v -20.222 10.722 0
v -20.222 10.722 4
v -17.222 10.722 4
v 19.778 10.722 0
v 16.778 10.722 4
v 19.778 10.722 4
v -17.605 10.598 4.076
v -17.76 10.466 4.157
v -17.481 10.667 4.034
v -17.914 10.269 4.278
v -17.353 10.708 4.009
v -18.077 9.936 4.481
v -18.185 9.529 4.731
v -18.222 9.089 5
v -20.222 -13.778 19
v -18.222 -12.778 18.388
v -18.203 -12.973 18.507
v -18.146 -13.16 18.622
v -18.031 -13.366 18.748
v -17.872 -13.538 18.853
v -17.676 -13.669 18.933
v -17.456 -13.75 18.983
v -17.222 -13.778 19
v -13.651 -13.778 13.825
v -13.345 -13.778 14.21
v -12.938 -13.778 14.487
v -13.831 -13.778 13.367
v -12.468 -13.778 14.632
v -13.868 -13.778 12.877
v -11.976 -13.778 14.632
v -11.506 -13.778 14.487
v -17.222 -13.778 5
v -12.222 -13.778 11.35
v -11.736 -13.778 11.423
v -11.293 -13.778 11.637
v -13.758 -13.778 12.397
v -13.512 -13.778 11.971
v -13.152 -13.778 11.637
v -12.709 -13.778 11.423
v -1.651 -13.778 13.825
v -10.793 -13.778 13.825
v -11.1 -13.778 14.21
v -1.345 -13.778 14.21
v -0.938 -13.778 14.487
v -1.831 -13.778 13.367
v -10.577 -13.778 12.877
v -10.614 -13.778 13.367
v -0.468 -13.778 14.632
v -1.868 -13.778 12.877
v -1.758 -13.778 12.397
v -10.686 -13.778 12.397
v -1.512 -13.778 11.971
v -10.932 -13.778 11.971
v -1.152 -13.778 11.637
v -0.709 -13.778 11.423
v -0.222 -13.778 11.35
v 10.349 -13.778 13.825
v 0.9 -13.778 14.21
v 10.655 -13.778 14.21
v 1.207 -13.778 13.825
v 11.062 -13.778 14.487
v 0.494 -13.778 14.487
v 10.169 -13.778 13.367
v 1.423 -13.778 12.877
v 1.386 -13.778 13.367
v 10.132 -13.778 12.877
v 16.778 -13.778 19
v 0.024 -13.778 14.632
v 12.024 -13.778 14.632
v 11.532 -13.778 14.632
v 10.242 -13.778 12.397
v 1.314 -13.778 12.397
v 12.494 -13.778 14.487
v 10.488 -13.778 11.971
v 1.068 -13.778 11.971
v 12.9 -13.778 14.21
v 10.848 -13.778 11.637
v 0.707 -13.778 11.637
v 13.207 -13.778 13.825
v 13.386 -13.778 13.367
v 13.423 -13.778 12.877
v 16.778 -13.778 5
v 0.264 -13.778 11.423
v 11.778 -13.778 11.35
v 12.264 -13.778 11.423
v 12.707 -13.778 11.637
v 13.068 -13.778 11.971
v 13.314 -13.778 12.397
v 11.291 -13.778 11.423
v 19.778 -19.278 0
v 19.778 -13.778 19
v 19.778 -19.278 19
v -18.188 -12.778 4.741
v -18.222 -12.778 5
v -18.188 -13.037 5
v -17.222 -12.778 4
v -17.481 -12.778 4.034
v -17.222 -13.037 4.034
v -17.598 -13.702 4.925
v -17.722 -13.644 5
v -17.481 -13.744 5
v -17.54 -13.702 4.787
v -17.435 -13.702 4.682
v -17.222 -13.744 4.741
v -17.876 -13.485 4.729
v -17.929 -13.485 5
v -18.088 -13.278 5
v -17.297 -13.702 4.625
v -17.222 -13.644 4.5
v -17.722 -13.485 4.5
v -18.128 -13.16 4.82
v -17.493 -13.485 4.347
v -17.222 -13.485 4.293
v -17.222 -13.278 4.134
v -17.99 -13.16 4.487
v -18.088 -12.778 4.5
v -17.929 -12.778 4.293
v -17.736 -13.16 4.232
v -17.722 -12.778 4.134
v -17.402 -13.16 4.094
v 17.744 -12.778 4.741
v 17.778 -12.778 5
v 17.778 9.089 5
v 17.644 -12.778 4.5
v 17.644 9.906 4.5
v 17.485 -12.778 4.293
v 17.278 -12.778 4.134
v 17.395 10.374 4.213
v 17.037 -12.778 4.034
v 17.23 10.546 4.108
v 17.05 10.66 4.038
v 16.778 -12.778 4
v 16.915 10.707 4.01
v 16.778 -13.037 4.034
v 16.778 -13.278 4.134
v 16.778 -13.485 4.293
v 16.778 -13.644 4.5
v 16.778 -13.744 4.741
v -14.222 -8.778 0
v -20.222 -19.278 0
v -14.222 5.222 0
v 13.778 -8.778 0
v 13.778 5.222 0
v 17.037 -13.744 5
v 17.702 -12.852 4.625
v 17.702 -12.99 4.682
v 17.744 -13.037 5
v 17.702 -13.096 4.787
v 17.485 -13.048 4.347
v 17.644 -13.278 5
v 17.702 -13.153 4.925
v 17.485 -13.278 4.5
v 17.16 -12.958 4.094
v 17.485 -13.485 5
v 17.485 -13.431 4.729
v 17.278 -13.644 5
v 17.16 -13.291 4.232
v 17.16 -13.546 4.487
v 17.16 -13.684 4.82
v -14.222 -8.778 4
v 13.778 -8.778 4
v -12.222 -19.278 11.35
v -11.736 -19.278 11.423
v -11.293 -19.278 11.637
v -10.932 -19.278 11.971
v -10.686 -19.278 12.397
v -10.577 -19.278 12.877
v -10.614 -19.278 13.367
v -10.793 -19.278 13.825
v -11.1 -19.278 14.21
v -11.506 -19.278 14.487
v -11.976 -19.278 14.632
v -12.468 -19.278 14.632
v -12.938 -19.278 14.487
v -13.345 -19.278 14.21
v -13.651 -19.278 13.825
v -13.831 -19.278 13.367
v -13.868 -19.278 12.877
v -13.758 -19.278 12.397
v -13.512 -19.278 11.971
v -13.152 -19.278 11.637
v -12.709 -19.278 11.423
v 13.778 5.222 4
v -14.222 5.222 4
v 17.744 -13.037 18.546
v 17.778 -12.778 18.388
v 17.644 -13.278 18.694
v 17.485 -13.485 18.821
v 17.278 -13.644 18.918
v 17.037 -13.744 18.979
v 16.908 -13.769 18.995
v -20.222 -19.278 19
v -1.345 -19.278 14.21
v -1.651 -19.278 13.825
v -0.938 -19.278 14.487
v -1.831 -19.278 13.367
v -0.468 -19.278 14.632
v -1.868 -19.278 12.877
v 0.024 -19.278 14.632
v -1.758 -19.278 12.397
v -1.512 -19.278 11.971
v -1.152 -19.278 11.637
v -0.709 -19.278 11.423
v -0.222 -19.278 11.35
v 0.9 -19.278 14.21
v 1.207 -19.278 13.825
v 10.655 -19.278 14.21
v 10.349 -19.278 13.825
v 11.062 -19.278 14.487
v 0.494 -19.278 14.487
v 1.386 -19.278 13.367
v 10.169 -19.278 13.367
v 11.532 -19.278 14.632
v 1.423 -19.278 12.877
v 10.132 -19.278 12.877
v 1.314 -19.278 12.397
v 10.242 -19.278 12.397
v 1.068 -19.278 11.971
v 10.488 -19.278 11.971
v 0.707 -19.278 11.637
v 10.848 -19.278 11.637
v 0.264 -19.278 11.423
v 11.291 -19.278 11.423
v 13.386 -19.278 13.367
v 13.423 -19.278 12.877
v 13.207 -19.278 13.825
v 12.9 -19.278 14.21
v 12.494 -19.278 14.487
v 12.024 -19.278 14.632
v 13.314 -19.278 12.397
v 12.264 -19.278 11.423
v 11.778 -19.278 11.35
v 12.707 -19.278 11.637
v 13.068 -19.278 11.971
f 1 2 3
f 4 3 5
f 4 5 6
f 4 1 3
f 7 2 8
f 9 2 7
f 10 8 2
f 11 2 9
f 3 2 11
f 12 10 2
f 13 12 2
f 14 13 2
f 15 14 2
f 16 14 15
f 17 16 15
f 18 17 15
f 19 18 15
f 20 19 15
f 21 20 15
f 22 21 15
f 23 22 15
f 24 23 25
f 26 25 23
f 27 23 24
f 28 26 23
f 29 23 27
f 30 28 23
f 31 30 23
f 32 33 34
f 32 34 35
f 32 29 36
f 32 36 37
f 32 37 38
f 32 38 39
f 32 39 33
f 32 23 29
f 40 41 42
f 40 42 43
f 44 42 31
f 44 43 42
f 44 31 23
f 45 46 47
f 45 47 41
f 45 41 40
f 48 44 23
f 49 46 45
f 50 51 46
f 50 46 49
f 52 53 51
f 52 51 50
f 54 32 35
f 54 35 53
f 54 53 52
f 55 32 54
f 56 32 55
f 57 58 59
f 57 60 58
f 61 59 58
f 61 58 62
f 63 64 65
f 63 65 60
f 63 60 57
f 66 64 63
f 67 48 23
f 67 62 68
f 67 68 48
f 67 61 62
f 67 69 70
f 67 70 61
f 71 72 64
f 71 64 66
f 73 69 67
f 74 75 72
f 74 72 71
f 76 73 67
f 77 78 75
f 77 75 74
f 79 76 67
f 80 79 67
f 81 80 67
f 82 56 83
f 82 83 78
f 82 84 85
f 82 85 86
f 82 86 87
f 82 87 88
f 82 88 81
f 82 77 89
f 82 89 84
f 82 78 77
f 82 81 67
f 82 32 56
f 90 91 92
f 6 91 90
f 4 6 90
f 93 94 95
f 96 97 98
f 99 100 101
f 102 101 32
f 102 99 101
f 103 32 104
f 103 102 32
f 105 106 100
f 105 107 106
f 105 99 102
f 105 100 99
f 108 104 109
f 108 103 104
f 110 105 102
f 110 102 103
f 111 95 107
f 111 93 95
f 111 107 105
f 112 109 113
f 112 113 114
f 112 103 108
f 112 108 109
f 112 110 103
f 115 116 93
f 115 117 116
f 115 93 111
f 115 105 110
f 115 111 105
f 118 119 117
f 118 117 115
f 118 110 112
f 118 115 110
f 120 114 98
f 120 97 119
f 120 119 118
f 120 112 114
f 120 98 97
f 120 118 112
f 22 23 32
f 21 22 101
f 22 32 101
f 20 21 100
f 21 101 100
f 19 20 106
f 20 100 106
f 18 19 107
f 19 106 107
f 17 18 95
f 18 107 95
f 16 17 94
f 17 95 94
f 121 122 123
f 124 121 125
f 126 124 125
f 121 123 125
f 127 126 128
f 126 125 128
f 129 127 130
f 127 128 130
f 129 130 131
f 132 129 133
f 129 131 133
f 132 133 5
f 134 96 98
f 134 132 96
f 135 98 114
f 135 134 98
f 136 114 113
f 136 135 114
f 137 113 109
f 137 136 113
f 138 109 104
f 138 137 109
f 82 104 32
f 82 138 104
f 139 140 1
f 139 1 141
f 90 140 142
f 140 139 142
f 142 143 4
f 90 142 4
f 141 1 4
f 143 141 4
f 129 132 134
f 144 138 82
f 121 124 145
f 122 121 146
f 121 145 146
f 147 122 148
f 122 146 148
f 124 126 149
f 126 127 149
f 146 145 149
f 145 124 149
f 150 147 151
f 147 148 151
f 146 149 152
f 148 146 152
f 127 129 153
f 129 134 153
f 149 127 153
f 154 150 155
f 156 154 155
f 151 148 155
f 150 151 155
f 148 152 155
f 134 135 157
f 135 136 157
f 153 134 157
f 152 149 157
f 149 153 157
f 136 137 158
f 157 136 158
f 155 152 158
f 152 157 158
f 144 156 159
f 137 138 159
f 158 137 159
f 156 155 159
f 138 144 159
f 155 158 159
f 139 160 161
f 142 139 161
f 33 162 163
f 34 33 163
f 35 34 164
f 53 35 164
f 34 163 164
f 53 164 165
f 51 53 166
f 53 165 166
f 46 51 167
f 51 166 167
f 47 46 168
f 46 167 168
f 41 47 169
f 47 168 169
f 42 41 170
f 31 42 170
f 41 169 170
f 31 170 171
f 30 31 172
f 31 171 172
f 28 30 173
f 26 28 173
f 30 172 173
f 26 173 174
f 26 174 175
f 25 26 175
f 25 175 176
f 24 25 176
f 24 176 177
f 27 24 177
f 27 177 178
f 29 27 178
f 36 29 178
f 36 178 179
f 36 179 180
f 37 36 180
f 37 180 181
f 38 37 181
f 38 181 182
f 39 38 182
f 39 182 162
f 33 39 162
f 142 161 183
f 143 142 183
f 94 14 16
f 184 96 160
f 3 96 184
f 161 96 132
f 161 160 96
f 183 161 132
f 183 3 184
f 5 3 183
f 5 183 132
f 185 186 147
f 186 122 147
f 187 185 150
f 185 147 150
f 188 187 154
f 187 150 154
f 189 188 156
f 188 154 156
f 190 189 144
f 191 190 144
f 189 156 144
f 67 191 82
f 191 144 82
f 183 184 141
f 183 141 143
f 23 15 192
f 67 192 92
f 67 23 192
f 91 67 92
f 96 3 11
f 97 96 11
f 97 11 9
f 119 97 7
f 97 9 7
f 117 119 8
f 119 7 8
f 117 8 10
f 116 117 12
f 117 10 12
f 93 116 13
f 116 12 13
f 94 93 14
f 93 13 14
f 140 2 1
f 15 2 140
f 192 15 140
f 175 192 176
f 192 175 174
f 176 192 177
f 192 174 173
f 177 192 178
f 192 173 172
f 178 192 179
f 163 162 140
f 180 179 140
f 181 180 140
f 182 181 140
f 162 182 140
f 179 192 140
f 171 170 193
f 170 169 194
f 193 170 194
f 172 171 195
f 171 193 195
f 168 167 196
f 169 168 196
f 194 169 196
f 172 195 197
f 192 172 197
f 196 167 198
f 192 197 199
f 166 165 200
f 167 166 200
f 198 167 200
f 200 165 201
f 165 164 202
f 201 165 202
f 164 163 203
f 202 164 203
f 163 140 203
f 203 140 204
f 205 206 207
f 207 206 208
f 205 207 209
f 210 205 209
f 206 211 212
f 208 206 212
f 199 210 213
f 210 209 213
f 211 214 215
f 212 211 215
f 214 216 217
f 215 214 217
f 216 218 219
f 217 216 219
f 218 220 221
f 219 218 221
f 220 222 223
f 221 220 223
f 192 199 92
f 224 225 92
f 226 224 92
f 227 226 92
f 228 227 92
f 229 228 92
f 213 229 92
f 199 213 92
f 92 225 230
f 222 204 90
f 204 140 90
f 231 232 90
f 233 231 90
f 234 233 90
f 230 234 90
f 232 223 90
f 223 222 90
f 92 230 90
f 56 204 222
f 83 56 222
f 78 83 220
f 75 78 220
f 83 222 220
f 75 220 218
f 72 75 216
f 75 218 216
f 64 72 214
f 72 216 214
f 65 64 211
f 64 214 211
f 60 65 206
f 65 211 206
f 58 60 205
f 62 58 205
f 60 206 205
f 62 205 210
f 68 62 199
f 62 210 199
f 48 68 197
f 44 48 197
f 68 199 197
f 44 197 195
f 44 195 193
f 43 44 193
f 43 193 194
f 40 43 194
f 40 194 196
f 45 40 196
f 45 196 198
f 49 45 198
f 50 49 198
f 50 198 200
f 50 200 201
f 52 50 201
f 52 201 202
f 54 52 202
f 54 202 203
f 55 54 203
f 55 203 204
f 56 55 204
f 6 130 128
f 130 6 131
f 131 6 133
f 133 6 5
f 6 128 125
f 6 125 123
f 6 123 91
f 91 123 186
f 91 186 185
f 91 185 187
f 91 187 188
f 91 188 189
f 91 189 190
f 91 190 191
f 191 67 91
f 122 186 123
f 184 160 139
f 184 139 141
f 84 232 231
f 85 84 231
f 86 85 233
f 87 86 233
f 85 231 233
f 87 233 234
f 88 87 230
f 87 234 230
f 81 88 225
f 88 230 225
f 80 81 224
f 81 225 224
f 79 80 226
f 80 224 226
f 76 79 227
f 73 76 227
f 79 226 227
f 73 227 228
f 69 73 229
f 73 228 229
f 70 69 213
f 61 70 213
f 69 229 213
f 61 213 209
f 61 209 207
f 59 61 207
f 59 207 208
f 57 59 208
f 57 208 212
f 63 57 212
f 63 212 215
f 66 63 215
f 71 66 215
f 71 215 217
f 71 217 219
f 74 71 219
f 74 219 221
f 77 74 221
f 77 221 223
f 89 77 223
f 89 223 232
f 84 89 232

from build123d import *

# Parameters (mm, degrees)
SKETCH1_W           = 40
SKETCH1_H           = 30
BOSS_EXTRUDE1_DEPTH = 4
SKETCH4_W           = 28
SKETCH4_H           = 14
CUT_EXTRUDE1_DEPTH  = 5.5
SKETCH5_W           = 40
SKETCH5_H           = 5.5
BOSS_EXTRUDE2_DEPTH = 15
SKETCH6_R           = 1.65
CUT_EXTRUDE3_DEPTH  = 15
RIB1_REACH          = 50.297
SKETCH8_WALL_W      = 127.321837908
SKETCH8_WALL_H      = 2
RIB14_REACH         = 50.297
SKETCH11_WALL_W     = 127.321837908
SKETCH11_WALL_H     = 2
FILLET1_R           = 1


with BuildPart() as part:
    # Sketch1 → Boss-Extrude1 (new body)
    with BuildSketch(Plane.XY):
        with Locations((-0.222222222, -4.277777778)):
            Rectangle(SKETCH1_W, SKETCH1_H)
    extrude(amount=BOSS_EXTRUDE1_DEPTH)

    # Sketch4 → Cut-Extrude1 (cut)
    with BuildSketch(Plane.XY.offset(4)):
        with Locations((-0.222222222, -1.777777778)):
            Rectangle(SKETCH4_W, SKETCH4_H)
    extrude(amount=-CUT_EXTRUDE1_DEPTH, mode=Mode.SUBTRACT)

    # Sketch5 → Boss-Extrude2 (add)
    with BuildSketch(Plane.XY.offset(4)):
        with Locations((-0.222222222, -16.527777778)):
            Rectangle(SKETCH5_W, SKETCH5_H)
    extrude(amount=BOSS_EXTRUDE2_DEPTH)

    # Sketch6 → Cut-Extrude3 (cut)
    with BuildSketch(Plane.XZ.offset(19.277777778)):
        with Locations((-12.222222222, 13)):
            Circle(SKETCH6_R)
        with Locations((-0.222222222, 13)):
            Circle(SKETCH6_R)
        with Locations((11.777777778, 13)):
            Circle(SKETCH6_R)
    extrude(amount=-CUT_EXTRUDE3_DEPTH, mode=Mode.SUBTRACT)

    # Sketch8 wall → Rib1 (add, up to next)
    with BuildSketch(Plane(origin=(-20.222222222, -1.527777778, 11.5), x_dir=(0, -0.852851304076, 0.522153859639), z_dir=(0, 0.522153859639, 0.852851304076)), mode=Mode.PRIVATE) as rib1_sk1:
        with Locations((0, 1)):
            Rectangle(SKETCH8_WALL_W, SKETCH8_WALL_H)
    rib1_tool1 = extrude(rib1_sk1.sketch, amount=-RIB1_REACH, mode=Mode.PRIVATE) - part.part
    add(rib1_tool1.solids().sort_by_distance((-20.222222222, -1.527777778, 11.5))[0])

    # Sketch11 wall → Rib14 (add, up to next)
    with BuildSketch(Plane(origin=(19.777777778, -1.527777778, 11.5), x_dir=(0, 0.852851304076, -0.522153859639), z_dir=(0, 0.522153859639, 0.852851304076)), mode=Mode.PRIVATE) as rib14_sk1:
        with Locations((0, 1)):
            Rectangle(SKETCH11_WALL_W, SKETCH11_WALL_H)
    rib14_tool1 = extrude(rib14_sk1.sketch, amount=-RIB14_REACH, mode=Mode.PRIVATE) - part.part
    add(rib14_tool1.solids().sort_by_distance((19.777777778, -1.527777778, 11.5))[0])

    # Fillet1
    fillet1_edges = [part.edges().sort_by_distance(p)[0] for p in [
        (17.777777778, -13.777777778, 11.5),
        (-18.222222222, -13.777777778, 11.5),
        (-0.222222222, -13.777777778, 4),
        (17.777777778, -1.527777778, 4),
        (-18.222222222, -1.527777778, 4),
    ]]
    fillet(fillet1_edges, radius=FILLET1_R)


solid = part.part
